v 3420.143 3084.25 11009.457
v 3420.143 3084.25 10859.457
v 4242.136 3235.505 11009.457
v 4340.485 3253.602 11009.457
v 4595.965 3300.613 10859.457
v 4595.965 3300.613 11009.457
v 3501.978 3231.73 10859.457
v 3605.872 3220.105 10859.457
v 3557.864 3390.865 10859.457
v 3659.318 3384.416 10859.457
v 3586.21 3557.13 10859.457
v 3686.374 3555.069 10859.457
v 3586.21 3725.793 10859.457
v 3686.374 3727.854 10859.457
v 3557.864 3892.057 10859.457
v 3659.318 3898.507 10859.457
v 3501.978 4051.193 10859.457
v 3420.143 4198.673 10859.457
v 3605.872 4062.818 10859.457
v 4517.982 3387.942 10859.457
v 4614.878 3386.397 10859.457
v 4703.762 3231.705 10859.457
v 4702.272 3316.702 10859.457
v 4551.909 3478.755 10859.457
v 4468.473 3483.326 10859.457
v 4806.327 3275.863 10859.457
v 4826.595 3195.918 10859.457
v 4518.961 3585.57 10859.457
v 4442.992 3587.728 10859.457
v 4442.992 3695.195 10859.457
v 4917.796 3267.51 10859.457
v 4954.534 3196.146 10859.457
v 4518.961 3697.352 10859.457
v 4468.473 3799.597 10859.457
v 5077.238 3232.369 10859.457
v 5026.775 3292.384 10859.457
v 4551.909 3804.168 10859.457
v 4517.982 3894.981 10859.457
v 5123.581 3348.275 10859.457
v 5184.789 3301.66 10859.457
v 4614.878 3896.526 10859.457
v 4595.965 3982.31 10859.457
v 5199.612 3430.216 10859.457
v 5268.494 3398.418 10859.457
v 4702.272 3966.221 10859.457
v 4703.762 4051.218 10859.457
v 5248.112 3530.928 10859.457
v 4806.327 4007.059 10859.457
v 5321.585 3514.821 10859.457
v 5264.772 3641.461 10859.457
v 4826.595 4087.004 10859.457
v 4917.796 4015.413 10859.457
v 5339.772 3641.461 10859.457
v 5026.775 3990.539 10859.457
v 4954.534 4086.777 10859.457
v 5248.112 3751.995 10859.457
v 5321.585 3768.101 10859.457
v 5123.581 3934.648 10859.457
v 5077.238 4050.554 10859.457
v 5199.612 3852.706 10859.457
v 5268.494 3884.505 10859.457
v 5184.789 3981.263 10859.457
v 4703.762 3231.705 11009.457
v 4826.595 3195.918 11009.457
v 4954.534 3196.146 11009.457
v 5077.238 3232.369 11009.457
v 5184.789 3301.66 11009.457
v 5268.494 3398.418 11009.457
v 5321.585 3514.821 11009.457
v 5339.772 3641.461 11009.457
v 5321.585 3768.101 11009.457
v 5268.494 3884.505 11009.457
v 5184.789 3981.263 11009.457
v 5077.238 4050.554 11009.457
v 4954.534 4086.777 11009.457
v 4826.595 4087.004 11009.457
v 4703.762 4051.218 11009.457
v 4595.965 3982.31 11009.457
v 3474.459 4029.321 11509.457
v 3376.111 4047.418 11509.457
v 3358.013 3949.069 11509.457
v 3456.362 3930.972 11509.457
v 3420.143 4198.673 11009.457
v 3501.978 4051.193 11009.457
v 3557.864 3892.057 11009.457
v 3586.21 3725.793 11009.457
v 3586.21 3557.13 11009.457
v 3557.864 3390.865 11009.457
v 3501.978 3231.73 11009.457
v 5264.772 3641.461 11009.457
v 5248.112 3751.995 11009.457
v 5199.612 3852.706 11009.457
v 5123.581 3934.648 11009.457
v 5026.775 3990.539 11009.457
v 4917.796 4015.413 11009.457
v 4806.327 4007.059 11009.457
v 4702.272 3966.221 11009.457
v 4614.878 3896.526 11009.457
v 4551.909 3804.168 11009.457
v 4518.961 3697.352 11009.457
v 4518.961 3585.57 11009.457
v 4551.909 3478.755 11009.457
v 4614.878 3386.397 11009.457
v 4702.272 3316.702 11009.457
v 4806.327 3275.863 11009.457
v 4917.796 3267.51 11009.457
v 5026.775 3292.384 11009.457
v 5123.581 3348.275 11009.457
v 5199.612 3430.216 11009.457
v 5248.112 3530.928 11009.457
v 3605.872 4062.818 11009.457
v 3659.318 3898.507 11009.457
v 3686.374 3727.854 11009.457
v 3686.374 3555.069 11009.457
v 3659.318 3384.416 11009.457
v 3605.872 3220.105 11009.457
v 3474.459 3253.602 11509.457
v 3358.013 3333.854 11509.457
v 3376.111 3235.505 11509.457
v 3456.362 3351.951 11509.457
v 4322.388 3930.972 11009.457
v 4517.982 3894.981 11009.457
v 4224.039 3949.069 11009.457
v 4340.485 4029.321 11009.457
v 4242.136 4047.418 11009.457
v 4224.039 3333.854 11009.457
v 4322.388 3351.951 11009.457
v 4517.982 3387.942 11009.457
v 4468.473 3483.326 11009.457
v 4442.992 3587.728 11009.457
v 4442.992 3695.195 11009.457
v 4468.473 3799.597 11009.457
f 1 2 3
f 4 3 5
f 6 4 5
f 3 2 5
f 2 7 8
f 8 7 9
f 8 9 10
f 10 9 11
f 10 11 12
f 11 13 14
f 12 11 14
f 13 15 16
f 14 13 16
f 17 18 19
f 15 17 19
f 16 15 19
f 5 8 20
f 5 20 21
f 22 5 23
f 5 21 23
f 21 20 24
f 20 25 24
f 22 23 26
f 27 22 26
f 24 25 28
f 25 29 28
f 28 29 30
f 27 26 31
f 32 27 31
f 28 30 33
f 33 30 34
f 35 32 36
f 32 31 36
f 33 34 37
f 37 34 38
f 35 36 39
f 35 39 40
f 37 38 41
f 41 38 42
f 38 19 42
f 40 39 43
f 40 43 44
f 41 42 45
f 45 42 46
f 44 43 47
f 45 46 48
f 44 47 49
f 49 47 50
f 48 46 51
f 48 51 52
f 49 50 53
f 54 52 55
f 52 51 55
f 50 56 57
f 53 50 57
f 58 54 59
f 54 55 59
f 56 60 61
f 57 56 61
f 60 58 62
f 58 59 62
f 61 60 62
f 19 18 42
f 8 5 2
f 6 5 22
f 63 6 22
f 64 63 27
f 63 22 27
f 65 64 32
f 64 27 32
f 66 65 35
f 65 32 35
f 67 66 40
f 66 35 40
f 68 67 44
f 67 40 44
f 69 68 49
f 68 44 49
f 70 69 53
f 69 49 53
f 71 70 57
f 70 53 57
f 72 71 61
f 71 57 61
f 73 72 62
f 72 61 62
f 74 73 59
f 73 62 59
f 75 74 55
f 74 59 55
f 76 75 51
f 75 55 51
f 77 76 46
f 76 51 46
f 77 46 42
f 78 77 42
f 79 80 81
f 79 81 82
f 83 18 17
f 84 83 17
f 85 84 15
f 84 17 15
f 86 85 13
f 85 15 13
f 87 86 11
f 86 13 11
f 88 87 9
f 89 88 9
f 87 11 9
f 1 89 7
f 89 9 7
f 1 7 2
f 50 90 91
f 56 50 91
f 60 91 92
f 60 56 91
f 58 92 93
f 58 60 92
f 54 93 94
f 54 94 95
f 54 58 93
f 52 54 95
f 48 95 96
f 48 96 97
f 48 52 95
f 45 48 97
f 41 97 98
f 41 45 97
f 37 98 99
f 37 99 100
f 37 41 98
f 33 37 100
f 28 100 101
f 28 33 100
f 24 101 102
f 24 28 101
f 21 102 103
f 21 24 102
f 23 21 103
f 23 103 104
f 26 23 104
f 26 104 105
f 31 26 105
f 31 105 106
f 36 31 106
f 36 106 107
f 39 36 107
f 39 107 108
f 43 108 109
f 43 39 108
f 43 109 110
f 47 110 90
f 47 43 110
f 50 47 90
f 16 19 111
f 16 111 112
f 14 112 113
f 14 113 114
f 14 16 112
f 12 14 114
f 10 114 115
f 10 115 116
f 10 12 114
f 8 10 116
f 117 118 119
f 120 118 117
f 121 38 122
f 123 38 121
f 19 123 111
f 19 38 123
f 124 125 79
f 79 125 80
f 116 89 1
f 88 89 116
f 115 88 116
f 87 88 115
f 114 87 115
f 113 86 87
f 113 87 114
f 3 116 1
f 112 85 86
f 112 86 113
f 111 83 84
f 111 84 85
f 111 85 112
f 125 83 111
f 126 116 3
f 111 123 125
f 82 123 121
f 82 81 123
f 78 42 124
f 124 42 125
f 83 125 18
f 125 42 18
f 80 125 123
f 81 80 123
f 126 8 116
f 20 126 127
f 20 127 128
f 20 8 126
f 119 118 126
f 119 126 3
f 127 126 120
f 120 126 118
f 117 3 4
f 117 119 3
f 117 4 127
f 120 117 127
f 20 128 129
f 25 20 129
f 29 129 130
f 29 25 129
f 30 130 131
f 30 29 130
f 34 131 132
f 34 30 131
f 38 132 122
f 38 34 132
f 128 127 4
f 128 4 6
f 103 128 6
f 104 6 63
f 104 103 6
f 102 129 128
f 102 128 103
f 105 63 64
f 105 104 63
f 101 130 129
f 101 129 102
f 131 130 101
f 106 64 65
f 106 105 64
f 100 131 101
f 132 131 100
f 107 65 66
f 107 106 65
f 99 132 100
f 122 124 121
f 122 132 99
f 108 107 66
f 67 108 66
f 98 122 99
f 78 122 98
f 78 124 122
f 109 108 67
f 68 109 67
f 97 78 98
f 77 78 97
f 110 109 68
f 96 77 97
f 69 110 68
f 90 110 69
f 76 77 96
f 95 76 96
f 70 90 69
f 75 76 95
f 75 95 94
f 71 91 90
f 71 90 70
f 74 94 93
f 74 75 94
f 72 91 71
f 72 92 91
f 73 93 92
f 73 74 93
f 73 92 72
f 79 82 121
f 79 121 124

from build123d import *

# Parameters (mm, degrees)
SKETCH2_R      = 375
EXTRUDE1_DEPTH = 150
EXTRUDE2_DEPTH = 1000


with BuildPart() as part:
    # Sketch2 → Extrude1 (new body)
    with BuildSketch(Plane.XY.offset(10859.457415778)):
        with BuildLine():
            Line((4595.965460825, 3982.309677998), (3420.142893862, 4198.672715486))
            ThreePointArc((3420.142893862, 4198.672715486), (3589.772208911, 3641.46133228), (3420.142893862, 3084.249949073))
            Line((3420.142893862, 3084.249949073), (4595.965460825, 3300.612986561))
            ThreePointArc((4595.965460825, 3300.612986561), (5339.772208911, 3641.46133228), (4595.965460825, 3982.309677998))
        make_face()
        with Locations((4889.772208911, 3641.46133228)):
            Circle(SKETCH2_R, mode=Mode.SUBTRACT)
        with BuildLine():
            Line((4517.981926059, 3894.980533873), (3605.871957835, 4062.817832453))
            ThreePointArc((3605.871957835, 4062.817832453), (3689.772208911, 3641.46133228), (3605.871957835, 3220.104832106))
            Line((3605.871957835, 3220.104832106), (4517.981926059, 3387.942130686))
            ThreePointArc((4517.981926059, 3387.942130686), (4439.772208911, 3641.46133228), (4517.981926059, 3894.980533873))
        make_face(mode=Mode.SUBTRACT)
    extrude(amount=EXTRUDE1_DEPTH)

    # Sketch3 → Extrude2 (add, along a direction that is not the sketch's normal)
    with BuildSketch(Plane.XY.offset(11009.457415778)):
        Polygon((4340.484797421, 4029.320658997), (4242.135965642, 4047.417821421), (4224.038803218, 3949.068989643), (4322.387634996, 3930.971827218), align=None)
        Polygon((4322.387634996, 3351.950837341), (4224.038803218, 3333.853674916), (4242.135965642, 3235.504843138), (4340.484797421, 3253.602005562), align=None)
    extrude(amount=EXTRUDE2_DEPTH, dir=(-0.866025404, 0, 0.5))


solid = part.part
